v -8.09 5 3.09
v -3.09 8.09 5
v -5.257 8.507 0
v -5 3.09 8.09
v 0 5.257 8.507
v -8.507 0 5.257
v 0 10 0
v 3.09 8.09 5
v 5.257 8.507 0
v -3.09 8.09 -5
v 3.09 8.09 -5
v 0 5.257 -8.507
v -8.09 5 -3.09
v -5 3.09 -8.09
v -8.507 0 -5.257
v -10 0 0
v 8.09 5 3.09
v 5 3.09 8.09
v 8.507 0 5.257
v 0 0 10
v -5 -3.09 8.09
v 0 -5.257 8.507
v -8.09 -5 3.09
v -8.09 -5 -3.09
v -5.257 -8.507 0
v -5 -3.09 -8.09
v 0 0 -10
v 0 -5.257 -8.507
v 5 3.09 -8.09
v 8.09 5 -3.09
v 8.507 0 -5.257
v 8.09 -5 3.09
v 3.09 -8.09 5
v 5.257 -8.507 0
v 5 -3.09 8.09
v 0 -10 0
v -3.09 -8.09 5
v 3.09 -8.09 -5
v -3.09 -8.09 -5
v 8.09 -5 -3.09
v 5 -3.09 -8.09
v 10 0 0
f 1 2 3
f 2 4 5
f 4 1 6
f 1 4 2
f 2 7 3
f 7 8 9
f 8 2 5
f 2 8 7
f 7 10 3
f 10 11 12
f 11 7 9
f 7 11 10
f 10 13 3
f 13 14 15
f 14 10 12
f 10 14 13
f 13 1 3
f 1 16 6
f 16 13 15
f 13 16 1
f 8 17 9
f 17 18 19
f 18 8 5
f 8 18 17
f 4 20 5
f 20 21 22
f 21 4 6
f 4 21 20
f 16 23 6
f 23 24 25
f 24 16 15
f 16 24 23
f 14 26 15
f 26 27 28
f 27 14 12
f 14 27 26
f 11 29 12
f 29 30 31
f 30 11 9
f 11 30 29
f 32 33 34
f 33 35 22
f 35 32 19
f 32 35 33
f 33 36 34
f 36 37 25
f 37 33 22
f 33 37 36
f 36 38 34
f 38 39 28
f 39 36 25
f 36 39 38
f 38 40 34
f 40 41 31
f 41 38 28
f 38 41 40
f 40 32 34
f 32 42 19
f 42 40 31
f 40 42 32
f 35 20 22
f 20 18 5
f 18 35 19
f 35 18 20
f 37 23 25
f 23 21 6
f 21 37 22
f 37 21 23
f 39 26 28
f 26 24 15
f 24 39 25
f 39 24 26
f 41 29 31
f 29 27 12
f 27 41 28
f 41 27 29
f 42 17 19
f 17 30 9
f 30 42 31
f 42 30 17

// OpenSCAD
// Icosphere — FIXED for Facet transpilation (original Wikibooks source was buggy).
// Changes from the original:
//  - optional icoPnts/icoTris default to [] instead of relying on undef truthiness
//  - removed the broken search()-based vertex dedup (the geometry kernel merges
//    coincident vertices; we always add the 3 edge midpoints)
//  - vector math written with explicit components ((p1[0]+p2[0])/2, norm inline),
//    since Facet '+' on lists concatenates rather than adding element-wise
//  - renamed the in-branch verts/tris reassignment to curVerts/curTris (no shadowing)
//  - added a top-level call so it renders standalone
// recursion: 0 = 20 tris, 1 = 80, 2 = 320.
module icosphere(radius = 10, recursion = 2, icoPnts = [], icoTris = []) {
  t = sqrt((5 + sqrt(5)) / 10);
  s = sqrt((5 - sqrt(5)) / 10);

  init = len(icoPnts) == 0 && len(icoTris) == 0;

  verts = [
    [-s, t, 0], [s, t, 0], [-s, -t, 0], [s, -t, 0],
    [0, -s, t], [0, s, t], [0, -s, -t], [0, s, -t],
    [t, 0, -s], [t, 0, s], [-t, 0, -s], [-t, 0, s]];

  tris = [
    [0, 5, 11], [0, 1, 5], [0, 7, 1], [0, 10, 7], [0, 11, 10],
    [1, 9, 5], [5, 4, 11], [11, 2, 10], [10, 6, 7], [7, 8, 1],
    [3, 4, 9], [3, 2, 4], [3, 6, 2], [3, 8, 6], [3, 9, 8],
    [4, 5, 9], [2, 11, 4], [6, 10, 2], [8, 7, 6], [9, 1, 8]];

  if (recursion > 0) {
    curVerts = init ? verts : icoPnts;
    curTris = init ? tris : icoTris;
    newSegments = recurseTris(curVerts, curTris);
    newVerts = newSegments[0];
    newTris = newSegments[1];
    icosphere(radius, recursion - 1, newVerts, newTris);
  } else if (init) {
    scale(radius) polyhedron(verts, tris);
  } else {
    scale(radius) polyhedron(icoPnts, icoTris);
  }
}

// Subdivide one triangle into four, adding the three edge midpoints.
function addTris(verts, tri) = let(
    a = getMiddlePoint(verts[tri[0]], verts[tri[1]]),
    b = getMiddlePoint(verts[tri[1]], verts[tri[2]]),
    c = getMiddlePoint(verts[tri[2]], verts[tri[0]]),
    l = len(verts)
  ) [concat(verts, [a, b, c]),
     [[tri[0], l, l + 2],
      [tri[1], l + 1, l],
      [tri[2], l + 2, l + 1],
      [l, l + 1, l + 2]]];

// One subdivision pass over every triangle (auto step count from len(tris)).
function recurseTris(verts, tris, newTris = [], steps = 0, step = 0) = let(
    stepsCnt = steps > 0 ? steps : len(tris) - 1,
    newSegment = addTris(verts, tris[step]),
    newVerts = newSegment[0],
    newerTris = concat(newTris, newSegment[1])
  ) stepsCnt == step ? [newVerts, newerTris]
                     : recurseTris(newVerts, tris, newerTris, stepsCnt, step + 1);

// Midpoint of two unit-sphere points, projected back to the unit sphere.
function getMiddlePoint(p1, p2) = fixPosition(
    [(p1[0] + p2[0]) / 2, (p1[1] + p2[1]) / 2, (p1[2] + p2[2]) / 2]);

function fixPosition(p) = let(l = sqrt(p[0] * p[0] + p[1] * p[1] + p[2] * p[2]))
    [p[0] / l, p[1] / l, p[2] / l];

icosphere(radius = 10, recursion = 1);
